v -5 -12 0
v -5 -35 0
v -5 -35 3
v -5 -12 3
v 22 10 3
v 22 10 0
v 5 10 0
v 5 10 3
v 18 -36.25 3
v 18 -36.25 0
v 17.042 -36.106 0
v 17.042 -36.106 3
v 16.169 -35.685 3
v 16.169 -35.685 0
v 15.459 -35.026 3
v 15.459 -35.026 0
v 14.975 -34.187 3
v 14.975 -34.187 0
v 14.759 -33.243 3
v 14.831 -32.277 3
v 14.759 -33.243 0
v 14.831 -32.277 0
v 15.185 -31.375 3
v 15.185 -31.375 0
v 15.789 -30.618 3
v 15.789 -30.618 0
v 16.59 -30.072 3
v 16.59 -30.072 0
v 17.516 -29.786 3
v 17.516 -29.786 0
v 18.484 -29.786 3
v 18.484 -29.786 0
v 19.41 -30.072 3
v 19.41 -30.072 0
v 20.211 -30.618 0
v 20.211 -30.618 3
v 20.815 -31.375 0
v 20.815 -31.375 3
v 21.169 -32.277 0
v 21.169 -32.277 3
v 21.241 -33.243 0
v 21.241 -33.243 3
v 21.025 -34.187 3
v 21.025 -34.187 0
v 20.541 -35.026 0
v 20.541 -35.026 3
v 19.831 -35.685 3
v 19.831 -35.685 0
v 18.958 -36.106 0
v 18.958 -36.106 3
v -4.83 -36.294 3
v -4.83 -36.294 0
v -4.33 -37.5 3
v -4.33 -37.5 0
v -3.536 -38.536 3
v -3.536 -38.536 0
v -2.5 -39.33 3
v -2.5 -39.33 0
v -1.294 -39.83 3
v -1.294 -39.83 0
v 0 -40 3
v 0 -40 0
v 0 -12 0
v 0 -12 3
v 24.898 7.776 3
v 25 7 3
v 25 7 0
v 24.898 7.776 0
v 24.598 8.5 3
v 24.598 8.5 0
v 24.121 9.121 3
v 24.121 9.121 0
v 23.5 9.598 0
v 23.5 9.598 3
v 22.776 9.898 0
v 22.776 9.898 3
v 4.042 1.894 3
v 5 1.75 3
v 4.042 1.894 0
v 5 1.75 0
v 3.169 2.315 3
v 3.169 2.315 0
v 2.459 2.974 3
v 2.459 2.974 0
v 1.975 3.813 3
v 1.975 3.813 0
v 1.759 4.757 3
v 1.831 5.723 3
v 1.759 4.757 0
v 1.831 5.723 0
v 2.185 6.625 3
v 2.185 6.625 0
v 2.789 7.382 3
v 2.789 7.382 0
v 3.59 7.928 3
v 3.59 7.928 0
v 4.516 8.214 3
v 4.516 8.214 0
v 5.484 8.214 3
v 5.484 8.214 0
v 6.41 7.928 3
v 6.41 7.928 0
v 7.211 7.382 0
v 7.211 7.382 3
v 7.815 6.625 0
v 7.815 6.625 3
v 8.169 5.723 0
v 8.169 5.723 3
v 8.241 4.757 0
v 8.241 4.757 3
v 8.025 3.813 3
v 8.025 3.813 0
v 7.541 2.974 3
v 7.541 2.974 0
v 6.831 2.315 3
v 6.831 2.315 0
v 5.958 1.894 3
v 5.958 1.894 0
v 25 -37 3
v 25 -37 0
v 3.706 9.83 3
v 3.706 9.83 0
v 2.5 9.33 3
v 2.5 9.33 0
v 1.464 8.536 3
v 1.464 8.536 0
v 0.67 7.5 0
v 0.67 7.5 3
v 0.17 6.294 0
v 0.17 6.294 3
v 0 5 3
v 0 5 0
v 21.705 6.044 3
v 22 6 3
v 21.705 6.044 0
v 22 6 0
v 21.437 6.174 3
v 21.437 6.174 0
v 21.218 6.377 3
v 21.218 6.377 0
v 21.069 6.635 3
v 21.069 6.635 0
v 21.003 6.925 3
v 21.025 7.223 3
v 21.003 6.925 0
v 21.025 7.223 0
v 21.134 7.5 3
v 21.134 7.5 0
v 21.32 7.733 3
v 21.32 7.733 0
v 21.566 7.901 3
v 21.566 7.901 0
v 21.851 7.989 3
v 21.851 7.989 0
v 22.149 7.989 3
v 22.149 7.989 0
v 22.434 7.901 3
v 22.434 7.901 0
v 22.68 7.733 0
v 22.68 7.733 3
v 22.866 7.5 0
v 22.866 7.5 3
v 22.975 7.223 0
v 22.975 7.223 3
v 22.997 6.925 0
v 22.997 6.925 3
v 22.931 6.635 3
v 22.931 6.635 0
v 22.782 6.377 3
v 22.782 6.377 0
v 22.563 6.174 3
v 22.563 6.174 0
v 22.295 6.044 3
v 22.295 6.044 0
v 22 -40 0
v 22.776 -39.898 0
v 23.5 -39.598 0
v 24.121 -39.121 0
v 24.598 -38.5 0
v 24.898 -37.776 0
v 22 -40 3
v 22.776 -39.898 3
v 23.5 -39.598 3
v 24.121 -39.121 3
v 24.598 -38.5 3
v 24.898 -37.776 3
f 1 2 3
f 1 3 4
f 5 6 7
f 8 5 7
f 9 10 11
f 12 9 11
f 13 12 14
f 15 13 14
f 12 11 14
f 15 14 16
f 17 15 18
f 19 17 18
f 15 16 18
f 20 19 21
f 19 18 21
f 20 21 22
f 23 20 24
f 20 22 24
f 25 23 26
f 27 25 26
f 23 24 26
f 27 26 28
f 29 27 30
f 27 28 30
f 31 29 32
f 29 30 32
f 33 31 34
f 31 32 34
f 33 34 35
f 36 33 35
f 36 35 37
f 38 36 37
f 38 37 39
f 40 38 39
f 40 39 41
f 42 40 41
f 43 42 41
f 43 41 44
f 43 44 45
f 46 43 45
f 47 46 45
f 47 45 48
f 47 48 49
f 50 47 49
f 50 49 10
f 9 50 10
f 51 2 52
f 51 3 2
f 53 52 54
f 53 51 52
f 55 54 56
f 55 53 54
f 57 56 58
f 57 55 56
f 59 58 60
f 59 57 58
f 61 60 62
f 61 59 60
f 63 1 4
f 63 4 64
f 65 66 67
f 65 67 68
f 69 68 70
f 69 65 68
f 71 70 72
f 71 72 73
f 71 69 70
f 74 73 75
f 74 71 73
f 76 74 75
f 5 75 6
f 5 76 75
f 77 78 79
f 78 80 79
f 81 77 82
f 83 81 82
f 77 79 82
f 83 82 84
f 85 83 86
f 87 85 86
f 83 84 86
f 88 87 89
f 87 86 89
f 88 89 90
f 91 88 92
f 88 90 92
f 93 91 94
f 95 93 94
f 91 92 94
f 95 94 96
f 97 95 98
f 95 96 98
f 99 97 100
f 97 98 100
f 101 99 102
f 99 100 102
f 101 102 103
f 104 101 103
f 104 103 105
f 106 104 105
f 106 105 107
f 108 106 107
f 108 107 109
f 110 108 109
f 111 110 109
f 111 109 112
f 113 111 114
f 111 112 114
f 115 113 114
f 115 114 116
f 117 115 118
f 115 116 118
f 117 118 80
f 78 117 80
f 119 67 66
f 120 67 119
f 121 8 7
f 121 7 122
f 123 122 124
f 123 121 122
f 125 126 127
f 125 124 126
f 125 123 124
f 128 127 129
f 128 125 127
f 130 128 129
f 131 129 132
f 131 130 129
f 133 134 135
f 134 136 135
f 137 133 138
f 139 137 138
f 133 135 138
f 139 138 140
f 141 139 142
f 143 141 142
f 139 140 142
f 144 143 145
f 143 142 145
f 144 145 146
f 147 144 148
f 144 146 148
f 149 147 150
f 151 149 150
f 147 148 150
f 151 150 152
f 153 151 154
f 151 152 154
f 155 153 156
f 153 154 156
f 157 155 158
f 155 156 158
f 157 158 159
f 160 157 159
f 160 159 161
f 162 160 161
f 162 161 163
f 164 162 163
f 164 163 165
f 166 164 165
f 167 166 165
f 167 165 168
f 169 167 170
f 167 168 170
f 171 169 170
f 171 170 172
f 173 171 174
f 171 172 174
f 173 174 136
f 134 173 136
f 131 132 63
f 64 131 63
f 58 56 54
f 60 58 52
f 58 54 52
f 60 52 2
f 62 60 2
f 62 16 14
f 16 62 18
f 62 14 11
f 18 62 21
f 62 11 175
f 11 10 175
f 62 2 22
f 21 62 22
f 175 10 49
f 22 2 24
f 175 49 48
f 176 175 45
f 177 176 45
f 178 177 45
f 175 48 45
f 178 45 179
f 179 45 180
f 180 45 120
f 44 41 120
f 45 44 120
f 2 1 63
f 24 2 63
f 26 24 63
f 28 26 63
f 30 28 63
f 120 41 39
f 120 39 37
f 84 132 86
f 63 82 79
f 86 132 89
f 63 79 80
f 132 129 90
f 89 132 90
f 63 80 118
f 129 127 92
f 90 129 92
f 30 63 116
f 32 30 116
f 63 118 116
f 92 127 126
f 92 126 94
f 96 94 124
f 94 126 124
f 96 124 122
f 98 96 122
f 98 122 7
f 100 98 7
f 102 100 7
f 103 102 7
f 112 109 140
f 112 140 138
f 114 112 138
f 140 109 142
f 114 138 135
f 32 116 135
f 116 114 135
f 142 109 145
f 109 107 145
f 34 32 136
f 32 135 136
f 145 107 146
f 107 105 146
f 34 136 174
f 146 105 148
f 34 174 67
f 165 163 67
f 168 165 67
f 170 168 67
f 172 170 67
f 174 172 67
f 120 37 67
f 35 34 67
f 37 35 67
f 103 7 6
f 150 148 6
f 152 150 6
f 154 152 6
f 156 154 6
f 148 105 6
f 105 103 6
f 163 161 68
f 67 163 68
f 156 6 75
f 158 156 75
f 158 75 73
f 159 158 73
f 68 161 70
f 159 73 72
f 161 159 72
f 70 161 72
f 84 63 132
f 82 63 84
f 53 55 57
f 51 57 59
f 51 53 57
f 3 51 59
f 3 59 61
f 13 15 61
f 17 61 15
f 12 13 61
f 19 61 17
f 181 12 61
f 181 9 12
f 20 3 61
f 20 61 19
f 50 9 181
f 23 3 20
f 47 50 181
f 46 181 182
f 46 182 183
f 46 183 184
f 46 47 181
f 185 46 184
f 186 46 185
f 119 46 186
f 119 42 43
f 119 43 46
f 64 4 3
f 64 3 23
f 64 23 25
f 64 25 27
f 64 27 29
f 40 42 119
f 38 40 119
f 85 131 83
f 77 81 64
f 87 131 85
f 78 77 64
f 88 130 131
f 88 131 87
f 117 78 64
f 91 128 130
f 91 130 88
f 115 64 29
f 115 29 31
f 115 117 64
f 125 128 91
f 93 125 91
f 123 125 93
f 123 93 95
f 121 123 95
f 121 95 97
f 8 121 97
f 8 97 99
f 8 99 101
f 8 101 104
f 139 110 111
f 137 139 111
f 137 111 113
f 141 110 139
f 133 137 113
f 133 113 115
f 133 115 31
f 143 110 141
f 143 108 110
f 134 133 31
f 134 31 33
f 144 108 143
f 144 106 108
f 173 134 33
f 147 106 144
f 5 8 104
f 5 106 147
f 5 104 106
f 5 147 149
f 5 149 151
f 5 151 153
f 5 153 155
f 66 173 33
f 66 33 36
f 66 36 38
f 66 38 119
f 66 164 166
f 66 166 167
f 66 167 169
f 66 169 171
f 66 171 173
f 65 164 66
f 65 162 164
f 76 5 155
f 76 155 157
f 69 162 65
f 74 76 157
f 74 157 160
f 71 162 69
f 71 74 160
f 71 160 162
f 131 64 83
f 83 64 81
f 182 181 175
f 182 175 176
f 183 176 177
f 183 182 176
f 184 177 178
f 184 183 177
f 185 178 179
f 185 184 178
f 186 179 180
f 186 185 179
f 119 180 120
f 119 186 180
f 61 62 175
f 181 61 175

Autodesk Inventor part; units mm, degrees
ref_plane "YZ Plane" through (0, 0, 0) normal (1, 0, 0) x (0, 1, 0)
ref_plane "XZ Plane" through (0, 0, 0) normal (0, 1, 0) x (-1, 0, 0)
ref_plane "XY Plane" through (0, 0, 0) normal (0, 0, 1) x (1, 0, 0)
sketch "Sketch1" plane through (0, 0, 0) normal (0, 0, 1) x (1, 0, 0)
  line L0 (0, 0) -> (10, 0)
  line L1 (10, 0) -> (10, 10)
  line L2 (10, 10) -> (0, 10)
  line L3 (0, 10) -> (0, 0)
  line L4 (10, 10) -> (25, 10)
  line L5 (25, 10) -> (25, 4)
  line L6 (25, 4) -> (10, 4)
  line L7 (10, 4) -> (10, 10)
  line L8 (10, 0) -> (0, 0)
  line L9 (0, 0) -> (0, -40)
  line L10 (0, -40) -> (10, -40)
  line L11 (10, -40) -> (10, 0)
  line L12 (0, -40) -> (-5, -40)
  line L13 (-5, -40) -> (-5, -12)
  line L14 (-5, -12) -> (0, -12)
  line L15 (0, -12) -> (0, -40)
  line L16 (10, 4) -> (25, 4)
  line L17 (25, 4) -> (25, -40)
  line L18 (25, -40) -> (10, -40)
  line L19 (10, -40) -> (10, 4)
  dimension "d0" = 10
  dimension "d2" = 15
  dimension "d3" = 6
  dimension "d5" = 28
  dimension "d6" = 5
  dimension "d7" = 10
  dimension "d30" = 22
extrude "Extrusion1" add sketch "Sketch1" along normal blind 3
fillet "Fillet1" radius 5 1 edges at (0, 10, 1.5)
fillet "Fillet2" radius 5 1 edges at (-5, -40, 1.5)
fillet "Fillet3" [suppressed]
fillet "Fillet4" [suppressed]
sketch "Sketch2" plane through (0, 0, 3) normal (0, 0, 1) x (1, 0, 0)
  line L0 (25, 10) -> (5, 10) projected
  line L1 (25, -40) -> (25, 10) projected
  point P0 (0, 0)
  point P1 (22, 7)
  dimension "d33" = 3
  dimension "d34" = 3
hole "Hole1" at (22, 7, 3) direction (0, 0, -1) diameter 2 end through all
sketch "Sketch3" plane through (0, 0, 3) normal (0, 0, 1) x (1, 0, 0)
  line L0 (25, 10) -> (5, 10) projected
  line L1 (0, 5) -> (0, -12) projected
  line L2 (25, -40) -> (25, 10) projected
  line L3 (0, -40) -> (25, -40) projected
  point P0 (0, 0)
  point P1 (5, 5)
  point P2 (22, 10)
  point P3 (18, -33)
  dimension "d20" = 5
  dimension "d31" = 5
  dimension "d36" = 7
  dimension "d37" = 7
hole "Hole2" at (5, 5, 3) at (18, -33, 3) direction (0, 0, -1) diameter 6.5 end through all
fillet "Fillet6" radius 3 2 edges at (25, -40, 1.5) (25, 10, 1.5)
sketch "Sketch4" plane through (0, 0, 3) normal (0, 0, 1) x (1, 0, 0)
  point P0 (0, 0)
properties part number "Selection_Lever 1" material "Nylon 6/6"
